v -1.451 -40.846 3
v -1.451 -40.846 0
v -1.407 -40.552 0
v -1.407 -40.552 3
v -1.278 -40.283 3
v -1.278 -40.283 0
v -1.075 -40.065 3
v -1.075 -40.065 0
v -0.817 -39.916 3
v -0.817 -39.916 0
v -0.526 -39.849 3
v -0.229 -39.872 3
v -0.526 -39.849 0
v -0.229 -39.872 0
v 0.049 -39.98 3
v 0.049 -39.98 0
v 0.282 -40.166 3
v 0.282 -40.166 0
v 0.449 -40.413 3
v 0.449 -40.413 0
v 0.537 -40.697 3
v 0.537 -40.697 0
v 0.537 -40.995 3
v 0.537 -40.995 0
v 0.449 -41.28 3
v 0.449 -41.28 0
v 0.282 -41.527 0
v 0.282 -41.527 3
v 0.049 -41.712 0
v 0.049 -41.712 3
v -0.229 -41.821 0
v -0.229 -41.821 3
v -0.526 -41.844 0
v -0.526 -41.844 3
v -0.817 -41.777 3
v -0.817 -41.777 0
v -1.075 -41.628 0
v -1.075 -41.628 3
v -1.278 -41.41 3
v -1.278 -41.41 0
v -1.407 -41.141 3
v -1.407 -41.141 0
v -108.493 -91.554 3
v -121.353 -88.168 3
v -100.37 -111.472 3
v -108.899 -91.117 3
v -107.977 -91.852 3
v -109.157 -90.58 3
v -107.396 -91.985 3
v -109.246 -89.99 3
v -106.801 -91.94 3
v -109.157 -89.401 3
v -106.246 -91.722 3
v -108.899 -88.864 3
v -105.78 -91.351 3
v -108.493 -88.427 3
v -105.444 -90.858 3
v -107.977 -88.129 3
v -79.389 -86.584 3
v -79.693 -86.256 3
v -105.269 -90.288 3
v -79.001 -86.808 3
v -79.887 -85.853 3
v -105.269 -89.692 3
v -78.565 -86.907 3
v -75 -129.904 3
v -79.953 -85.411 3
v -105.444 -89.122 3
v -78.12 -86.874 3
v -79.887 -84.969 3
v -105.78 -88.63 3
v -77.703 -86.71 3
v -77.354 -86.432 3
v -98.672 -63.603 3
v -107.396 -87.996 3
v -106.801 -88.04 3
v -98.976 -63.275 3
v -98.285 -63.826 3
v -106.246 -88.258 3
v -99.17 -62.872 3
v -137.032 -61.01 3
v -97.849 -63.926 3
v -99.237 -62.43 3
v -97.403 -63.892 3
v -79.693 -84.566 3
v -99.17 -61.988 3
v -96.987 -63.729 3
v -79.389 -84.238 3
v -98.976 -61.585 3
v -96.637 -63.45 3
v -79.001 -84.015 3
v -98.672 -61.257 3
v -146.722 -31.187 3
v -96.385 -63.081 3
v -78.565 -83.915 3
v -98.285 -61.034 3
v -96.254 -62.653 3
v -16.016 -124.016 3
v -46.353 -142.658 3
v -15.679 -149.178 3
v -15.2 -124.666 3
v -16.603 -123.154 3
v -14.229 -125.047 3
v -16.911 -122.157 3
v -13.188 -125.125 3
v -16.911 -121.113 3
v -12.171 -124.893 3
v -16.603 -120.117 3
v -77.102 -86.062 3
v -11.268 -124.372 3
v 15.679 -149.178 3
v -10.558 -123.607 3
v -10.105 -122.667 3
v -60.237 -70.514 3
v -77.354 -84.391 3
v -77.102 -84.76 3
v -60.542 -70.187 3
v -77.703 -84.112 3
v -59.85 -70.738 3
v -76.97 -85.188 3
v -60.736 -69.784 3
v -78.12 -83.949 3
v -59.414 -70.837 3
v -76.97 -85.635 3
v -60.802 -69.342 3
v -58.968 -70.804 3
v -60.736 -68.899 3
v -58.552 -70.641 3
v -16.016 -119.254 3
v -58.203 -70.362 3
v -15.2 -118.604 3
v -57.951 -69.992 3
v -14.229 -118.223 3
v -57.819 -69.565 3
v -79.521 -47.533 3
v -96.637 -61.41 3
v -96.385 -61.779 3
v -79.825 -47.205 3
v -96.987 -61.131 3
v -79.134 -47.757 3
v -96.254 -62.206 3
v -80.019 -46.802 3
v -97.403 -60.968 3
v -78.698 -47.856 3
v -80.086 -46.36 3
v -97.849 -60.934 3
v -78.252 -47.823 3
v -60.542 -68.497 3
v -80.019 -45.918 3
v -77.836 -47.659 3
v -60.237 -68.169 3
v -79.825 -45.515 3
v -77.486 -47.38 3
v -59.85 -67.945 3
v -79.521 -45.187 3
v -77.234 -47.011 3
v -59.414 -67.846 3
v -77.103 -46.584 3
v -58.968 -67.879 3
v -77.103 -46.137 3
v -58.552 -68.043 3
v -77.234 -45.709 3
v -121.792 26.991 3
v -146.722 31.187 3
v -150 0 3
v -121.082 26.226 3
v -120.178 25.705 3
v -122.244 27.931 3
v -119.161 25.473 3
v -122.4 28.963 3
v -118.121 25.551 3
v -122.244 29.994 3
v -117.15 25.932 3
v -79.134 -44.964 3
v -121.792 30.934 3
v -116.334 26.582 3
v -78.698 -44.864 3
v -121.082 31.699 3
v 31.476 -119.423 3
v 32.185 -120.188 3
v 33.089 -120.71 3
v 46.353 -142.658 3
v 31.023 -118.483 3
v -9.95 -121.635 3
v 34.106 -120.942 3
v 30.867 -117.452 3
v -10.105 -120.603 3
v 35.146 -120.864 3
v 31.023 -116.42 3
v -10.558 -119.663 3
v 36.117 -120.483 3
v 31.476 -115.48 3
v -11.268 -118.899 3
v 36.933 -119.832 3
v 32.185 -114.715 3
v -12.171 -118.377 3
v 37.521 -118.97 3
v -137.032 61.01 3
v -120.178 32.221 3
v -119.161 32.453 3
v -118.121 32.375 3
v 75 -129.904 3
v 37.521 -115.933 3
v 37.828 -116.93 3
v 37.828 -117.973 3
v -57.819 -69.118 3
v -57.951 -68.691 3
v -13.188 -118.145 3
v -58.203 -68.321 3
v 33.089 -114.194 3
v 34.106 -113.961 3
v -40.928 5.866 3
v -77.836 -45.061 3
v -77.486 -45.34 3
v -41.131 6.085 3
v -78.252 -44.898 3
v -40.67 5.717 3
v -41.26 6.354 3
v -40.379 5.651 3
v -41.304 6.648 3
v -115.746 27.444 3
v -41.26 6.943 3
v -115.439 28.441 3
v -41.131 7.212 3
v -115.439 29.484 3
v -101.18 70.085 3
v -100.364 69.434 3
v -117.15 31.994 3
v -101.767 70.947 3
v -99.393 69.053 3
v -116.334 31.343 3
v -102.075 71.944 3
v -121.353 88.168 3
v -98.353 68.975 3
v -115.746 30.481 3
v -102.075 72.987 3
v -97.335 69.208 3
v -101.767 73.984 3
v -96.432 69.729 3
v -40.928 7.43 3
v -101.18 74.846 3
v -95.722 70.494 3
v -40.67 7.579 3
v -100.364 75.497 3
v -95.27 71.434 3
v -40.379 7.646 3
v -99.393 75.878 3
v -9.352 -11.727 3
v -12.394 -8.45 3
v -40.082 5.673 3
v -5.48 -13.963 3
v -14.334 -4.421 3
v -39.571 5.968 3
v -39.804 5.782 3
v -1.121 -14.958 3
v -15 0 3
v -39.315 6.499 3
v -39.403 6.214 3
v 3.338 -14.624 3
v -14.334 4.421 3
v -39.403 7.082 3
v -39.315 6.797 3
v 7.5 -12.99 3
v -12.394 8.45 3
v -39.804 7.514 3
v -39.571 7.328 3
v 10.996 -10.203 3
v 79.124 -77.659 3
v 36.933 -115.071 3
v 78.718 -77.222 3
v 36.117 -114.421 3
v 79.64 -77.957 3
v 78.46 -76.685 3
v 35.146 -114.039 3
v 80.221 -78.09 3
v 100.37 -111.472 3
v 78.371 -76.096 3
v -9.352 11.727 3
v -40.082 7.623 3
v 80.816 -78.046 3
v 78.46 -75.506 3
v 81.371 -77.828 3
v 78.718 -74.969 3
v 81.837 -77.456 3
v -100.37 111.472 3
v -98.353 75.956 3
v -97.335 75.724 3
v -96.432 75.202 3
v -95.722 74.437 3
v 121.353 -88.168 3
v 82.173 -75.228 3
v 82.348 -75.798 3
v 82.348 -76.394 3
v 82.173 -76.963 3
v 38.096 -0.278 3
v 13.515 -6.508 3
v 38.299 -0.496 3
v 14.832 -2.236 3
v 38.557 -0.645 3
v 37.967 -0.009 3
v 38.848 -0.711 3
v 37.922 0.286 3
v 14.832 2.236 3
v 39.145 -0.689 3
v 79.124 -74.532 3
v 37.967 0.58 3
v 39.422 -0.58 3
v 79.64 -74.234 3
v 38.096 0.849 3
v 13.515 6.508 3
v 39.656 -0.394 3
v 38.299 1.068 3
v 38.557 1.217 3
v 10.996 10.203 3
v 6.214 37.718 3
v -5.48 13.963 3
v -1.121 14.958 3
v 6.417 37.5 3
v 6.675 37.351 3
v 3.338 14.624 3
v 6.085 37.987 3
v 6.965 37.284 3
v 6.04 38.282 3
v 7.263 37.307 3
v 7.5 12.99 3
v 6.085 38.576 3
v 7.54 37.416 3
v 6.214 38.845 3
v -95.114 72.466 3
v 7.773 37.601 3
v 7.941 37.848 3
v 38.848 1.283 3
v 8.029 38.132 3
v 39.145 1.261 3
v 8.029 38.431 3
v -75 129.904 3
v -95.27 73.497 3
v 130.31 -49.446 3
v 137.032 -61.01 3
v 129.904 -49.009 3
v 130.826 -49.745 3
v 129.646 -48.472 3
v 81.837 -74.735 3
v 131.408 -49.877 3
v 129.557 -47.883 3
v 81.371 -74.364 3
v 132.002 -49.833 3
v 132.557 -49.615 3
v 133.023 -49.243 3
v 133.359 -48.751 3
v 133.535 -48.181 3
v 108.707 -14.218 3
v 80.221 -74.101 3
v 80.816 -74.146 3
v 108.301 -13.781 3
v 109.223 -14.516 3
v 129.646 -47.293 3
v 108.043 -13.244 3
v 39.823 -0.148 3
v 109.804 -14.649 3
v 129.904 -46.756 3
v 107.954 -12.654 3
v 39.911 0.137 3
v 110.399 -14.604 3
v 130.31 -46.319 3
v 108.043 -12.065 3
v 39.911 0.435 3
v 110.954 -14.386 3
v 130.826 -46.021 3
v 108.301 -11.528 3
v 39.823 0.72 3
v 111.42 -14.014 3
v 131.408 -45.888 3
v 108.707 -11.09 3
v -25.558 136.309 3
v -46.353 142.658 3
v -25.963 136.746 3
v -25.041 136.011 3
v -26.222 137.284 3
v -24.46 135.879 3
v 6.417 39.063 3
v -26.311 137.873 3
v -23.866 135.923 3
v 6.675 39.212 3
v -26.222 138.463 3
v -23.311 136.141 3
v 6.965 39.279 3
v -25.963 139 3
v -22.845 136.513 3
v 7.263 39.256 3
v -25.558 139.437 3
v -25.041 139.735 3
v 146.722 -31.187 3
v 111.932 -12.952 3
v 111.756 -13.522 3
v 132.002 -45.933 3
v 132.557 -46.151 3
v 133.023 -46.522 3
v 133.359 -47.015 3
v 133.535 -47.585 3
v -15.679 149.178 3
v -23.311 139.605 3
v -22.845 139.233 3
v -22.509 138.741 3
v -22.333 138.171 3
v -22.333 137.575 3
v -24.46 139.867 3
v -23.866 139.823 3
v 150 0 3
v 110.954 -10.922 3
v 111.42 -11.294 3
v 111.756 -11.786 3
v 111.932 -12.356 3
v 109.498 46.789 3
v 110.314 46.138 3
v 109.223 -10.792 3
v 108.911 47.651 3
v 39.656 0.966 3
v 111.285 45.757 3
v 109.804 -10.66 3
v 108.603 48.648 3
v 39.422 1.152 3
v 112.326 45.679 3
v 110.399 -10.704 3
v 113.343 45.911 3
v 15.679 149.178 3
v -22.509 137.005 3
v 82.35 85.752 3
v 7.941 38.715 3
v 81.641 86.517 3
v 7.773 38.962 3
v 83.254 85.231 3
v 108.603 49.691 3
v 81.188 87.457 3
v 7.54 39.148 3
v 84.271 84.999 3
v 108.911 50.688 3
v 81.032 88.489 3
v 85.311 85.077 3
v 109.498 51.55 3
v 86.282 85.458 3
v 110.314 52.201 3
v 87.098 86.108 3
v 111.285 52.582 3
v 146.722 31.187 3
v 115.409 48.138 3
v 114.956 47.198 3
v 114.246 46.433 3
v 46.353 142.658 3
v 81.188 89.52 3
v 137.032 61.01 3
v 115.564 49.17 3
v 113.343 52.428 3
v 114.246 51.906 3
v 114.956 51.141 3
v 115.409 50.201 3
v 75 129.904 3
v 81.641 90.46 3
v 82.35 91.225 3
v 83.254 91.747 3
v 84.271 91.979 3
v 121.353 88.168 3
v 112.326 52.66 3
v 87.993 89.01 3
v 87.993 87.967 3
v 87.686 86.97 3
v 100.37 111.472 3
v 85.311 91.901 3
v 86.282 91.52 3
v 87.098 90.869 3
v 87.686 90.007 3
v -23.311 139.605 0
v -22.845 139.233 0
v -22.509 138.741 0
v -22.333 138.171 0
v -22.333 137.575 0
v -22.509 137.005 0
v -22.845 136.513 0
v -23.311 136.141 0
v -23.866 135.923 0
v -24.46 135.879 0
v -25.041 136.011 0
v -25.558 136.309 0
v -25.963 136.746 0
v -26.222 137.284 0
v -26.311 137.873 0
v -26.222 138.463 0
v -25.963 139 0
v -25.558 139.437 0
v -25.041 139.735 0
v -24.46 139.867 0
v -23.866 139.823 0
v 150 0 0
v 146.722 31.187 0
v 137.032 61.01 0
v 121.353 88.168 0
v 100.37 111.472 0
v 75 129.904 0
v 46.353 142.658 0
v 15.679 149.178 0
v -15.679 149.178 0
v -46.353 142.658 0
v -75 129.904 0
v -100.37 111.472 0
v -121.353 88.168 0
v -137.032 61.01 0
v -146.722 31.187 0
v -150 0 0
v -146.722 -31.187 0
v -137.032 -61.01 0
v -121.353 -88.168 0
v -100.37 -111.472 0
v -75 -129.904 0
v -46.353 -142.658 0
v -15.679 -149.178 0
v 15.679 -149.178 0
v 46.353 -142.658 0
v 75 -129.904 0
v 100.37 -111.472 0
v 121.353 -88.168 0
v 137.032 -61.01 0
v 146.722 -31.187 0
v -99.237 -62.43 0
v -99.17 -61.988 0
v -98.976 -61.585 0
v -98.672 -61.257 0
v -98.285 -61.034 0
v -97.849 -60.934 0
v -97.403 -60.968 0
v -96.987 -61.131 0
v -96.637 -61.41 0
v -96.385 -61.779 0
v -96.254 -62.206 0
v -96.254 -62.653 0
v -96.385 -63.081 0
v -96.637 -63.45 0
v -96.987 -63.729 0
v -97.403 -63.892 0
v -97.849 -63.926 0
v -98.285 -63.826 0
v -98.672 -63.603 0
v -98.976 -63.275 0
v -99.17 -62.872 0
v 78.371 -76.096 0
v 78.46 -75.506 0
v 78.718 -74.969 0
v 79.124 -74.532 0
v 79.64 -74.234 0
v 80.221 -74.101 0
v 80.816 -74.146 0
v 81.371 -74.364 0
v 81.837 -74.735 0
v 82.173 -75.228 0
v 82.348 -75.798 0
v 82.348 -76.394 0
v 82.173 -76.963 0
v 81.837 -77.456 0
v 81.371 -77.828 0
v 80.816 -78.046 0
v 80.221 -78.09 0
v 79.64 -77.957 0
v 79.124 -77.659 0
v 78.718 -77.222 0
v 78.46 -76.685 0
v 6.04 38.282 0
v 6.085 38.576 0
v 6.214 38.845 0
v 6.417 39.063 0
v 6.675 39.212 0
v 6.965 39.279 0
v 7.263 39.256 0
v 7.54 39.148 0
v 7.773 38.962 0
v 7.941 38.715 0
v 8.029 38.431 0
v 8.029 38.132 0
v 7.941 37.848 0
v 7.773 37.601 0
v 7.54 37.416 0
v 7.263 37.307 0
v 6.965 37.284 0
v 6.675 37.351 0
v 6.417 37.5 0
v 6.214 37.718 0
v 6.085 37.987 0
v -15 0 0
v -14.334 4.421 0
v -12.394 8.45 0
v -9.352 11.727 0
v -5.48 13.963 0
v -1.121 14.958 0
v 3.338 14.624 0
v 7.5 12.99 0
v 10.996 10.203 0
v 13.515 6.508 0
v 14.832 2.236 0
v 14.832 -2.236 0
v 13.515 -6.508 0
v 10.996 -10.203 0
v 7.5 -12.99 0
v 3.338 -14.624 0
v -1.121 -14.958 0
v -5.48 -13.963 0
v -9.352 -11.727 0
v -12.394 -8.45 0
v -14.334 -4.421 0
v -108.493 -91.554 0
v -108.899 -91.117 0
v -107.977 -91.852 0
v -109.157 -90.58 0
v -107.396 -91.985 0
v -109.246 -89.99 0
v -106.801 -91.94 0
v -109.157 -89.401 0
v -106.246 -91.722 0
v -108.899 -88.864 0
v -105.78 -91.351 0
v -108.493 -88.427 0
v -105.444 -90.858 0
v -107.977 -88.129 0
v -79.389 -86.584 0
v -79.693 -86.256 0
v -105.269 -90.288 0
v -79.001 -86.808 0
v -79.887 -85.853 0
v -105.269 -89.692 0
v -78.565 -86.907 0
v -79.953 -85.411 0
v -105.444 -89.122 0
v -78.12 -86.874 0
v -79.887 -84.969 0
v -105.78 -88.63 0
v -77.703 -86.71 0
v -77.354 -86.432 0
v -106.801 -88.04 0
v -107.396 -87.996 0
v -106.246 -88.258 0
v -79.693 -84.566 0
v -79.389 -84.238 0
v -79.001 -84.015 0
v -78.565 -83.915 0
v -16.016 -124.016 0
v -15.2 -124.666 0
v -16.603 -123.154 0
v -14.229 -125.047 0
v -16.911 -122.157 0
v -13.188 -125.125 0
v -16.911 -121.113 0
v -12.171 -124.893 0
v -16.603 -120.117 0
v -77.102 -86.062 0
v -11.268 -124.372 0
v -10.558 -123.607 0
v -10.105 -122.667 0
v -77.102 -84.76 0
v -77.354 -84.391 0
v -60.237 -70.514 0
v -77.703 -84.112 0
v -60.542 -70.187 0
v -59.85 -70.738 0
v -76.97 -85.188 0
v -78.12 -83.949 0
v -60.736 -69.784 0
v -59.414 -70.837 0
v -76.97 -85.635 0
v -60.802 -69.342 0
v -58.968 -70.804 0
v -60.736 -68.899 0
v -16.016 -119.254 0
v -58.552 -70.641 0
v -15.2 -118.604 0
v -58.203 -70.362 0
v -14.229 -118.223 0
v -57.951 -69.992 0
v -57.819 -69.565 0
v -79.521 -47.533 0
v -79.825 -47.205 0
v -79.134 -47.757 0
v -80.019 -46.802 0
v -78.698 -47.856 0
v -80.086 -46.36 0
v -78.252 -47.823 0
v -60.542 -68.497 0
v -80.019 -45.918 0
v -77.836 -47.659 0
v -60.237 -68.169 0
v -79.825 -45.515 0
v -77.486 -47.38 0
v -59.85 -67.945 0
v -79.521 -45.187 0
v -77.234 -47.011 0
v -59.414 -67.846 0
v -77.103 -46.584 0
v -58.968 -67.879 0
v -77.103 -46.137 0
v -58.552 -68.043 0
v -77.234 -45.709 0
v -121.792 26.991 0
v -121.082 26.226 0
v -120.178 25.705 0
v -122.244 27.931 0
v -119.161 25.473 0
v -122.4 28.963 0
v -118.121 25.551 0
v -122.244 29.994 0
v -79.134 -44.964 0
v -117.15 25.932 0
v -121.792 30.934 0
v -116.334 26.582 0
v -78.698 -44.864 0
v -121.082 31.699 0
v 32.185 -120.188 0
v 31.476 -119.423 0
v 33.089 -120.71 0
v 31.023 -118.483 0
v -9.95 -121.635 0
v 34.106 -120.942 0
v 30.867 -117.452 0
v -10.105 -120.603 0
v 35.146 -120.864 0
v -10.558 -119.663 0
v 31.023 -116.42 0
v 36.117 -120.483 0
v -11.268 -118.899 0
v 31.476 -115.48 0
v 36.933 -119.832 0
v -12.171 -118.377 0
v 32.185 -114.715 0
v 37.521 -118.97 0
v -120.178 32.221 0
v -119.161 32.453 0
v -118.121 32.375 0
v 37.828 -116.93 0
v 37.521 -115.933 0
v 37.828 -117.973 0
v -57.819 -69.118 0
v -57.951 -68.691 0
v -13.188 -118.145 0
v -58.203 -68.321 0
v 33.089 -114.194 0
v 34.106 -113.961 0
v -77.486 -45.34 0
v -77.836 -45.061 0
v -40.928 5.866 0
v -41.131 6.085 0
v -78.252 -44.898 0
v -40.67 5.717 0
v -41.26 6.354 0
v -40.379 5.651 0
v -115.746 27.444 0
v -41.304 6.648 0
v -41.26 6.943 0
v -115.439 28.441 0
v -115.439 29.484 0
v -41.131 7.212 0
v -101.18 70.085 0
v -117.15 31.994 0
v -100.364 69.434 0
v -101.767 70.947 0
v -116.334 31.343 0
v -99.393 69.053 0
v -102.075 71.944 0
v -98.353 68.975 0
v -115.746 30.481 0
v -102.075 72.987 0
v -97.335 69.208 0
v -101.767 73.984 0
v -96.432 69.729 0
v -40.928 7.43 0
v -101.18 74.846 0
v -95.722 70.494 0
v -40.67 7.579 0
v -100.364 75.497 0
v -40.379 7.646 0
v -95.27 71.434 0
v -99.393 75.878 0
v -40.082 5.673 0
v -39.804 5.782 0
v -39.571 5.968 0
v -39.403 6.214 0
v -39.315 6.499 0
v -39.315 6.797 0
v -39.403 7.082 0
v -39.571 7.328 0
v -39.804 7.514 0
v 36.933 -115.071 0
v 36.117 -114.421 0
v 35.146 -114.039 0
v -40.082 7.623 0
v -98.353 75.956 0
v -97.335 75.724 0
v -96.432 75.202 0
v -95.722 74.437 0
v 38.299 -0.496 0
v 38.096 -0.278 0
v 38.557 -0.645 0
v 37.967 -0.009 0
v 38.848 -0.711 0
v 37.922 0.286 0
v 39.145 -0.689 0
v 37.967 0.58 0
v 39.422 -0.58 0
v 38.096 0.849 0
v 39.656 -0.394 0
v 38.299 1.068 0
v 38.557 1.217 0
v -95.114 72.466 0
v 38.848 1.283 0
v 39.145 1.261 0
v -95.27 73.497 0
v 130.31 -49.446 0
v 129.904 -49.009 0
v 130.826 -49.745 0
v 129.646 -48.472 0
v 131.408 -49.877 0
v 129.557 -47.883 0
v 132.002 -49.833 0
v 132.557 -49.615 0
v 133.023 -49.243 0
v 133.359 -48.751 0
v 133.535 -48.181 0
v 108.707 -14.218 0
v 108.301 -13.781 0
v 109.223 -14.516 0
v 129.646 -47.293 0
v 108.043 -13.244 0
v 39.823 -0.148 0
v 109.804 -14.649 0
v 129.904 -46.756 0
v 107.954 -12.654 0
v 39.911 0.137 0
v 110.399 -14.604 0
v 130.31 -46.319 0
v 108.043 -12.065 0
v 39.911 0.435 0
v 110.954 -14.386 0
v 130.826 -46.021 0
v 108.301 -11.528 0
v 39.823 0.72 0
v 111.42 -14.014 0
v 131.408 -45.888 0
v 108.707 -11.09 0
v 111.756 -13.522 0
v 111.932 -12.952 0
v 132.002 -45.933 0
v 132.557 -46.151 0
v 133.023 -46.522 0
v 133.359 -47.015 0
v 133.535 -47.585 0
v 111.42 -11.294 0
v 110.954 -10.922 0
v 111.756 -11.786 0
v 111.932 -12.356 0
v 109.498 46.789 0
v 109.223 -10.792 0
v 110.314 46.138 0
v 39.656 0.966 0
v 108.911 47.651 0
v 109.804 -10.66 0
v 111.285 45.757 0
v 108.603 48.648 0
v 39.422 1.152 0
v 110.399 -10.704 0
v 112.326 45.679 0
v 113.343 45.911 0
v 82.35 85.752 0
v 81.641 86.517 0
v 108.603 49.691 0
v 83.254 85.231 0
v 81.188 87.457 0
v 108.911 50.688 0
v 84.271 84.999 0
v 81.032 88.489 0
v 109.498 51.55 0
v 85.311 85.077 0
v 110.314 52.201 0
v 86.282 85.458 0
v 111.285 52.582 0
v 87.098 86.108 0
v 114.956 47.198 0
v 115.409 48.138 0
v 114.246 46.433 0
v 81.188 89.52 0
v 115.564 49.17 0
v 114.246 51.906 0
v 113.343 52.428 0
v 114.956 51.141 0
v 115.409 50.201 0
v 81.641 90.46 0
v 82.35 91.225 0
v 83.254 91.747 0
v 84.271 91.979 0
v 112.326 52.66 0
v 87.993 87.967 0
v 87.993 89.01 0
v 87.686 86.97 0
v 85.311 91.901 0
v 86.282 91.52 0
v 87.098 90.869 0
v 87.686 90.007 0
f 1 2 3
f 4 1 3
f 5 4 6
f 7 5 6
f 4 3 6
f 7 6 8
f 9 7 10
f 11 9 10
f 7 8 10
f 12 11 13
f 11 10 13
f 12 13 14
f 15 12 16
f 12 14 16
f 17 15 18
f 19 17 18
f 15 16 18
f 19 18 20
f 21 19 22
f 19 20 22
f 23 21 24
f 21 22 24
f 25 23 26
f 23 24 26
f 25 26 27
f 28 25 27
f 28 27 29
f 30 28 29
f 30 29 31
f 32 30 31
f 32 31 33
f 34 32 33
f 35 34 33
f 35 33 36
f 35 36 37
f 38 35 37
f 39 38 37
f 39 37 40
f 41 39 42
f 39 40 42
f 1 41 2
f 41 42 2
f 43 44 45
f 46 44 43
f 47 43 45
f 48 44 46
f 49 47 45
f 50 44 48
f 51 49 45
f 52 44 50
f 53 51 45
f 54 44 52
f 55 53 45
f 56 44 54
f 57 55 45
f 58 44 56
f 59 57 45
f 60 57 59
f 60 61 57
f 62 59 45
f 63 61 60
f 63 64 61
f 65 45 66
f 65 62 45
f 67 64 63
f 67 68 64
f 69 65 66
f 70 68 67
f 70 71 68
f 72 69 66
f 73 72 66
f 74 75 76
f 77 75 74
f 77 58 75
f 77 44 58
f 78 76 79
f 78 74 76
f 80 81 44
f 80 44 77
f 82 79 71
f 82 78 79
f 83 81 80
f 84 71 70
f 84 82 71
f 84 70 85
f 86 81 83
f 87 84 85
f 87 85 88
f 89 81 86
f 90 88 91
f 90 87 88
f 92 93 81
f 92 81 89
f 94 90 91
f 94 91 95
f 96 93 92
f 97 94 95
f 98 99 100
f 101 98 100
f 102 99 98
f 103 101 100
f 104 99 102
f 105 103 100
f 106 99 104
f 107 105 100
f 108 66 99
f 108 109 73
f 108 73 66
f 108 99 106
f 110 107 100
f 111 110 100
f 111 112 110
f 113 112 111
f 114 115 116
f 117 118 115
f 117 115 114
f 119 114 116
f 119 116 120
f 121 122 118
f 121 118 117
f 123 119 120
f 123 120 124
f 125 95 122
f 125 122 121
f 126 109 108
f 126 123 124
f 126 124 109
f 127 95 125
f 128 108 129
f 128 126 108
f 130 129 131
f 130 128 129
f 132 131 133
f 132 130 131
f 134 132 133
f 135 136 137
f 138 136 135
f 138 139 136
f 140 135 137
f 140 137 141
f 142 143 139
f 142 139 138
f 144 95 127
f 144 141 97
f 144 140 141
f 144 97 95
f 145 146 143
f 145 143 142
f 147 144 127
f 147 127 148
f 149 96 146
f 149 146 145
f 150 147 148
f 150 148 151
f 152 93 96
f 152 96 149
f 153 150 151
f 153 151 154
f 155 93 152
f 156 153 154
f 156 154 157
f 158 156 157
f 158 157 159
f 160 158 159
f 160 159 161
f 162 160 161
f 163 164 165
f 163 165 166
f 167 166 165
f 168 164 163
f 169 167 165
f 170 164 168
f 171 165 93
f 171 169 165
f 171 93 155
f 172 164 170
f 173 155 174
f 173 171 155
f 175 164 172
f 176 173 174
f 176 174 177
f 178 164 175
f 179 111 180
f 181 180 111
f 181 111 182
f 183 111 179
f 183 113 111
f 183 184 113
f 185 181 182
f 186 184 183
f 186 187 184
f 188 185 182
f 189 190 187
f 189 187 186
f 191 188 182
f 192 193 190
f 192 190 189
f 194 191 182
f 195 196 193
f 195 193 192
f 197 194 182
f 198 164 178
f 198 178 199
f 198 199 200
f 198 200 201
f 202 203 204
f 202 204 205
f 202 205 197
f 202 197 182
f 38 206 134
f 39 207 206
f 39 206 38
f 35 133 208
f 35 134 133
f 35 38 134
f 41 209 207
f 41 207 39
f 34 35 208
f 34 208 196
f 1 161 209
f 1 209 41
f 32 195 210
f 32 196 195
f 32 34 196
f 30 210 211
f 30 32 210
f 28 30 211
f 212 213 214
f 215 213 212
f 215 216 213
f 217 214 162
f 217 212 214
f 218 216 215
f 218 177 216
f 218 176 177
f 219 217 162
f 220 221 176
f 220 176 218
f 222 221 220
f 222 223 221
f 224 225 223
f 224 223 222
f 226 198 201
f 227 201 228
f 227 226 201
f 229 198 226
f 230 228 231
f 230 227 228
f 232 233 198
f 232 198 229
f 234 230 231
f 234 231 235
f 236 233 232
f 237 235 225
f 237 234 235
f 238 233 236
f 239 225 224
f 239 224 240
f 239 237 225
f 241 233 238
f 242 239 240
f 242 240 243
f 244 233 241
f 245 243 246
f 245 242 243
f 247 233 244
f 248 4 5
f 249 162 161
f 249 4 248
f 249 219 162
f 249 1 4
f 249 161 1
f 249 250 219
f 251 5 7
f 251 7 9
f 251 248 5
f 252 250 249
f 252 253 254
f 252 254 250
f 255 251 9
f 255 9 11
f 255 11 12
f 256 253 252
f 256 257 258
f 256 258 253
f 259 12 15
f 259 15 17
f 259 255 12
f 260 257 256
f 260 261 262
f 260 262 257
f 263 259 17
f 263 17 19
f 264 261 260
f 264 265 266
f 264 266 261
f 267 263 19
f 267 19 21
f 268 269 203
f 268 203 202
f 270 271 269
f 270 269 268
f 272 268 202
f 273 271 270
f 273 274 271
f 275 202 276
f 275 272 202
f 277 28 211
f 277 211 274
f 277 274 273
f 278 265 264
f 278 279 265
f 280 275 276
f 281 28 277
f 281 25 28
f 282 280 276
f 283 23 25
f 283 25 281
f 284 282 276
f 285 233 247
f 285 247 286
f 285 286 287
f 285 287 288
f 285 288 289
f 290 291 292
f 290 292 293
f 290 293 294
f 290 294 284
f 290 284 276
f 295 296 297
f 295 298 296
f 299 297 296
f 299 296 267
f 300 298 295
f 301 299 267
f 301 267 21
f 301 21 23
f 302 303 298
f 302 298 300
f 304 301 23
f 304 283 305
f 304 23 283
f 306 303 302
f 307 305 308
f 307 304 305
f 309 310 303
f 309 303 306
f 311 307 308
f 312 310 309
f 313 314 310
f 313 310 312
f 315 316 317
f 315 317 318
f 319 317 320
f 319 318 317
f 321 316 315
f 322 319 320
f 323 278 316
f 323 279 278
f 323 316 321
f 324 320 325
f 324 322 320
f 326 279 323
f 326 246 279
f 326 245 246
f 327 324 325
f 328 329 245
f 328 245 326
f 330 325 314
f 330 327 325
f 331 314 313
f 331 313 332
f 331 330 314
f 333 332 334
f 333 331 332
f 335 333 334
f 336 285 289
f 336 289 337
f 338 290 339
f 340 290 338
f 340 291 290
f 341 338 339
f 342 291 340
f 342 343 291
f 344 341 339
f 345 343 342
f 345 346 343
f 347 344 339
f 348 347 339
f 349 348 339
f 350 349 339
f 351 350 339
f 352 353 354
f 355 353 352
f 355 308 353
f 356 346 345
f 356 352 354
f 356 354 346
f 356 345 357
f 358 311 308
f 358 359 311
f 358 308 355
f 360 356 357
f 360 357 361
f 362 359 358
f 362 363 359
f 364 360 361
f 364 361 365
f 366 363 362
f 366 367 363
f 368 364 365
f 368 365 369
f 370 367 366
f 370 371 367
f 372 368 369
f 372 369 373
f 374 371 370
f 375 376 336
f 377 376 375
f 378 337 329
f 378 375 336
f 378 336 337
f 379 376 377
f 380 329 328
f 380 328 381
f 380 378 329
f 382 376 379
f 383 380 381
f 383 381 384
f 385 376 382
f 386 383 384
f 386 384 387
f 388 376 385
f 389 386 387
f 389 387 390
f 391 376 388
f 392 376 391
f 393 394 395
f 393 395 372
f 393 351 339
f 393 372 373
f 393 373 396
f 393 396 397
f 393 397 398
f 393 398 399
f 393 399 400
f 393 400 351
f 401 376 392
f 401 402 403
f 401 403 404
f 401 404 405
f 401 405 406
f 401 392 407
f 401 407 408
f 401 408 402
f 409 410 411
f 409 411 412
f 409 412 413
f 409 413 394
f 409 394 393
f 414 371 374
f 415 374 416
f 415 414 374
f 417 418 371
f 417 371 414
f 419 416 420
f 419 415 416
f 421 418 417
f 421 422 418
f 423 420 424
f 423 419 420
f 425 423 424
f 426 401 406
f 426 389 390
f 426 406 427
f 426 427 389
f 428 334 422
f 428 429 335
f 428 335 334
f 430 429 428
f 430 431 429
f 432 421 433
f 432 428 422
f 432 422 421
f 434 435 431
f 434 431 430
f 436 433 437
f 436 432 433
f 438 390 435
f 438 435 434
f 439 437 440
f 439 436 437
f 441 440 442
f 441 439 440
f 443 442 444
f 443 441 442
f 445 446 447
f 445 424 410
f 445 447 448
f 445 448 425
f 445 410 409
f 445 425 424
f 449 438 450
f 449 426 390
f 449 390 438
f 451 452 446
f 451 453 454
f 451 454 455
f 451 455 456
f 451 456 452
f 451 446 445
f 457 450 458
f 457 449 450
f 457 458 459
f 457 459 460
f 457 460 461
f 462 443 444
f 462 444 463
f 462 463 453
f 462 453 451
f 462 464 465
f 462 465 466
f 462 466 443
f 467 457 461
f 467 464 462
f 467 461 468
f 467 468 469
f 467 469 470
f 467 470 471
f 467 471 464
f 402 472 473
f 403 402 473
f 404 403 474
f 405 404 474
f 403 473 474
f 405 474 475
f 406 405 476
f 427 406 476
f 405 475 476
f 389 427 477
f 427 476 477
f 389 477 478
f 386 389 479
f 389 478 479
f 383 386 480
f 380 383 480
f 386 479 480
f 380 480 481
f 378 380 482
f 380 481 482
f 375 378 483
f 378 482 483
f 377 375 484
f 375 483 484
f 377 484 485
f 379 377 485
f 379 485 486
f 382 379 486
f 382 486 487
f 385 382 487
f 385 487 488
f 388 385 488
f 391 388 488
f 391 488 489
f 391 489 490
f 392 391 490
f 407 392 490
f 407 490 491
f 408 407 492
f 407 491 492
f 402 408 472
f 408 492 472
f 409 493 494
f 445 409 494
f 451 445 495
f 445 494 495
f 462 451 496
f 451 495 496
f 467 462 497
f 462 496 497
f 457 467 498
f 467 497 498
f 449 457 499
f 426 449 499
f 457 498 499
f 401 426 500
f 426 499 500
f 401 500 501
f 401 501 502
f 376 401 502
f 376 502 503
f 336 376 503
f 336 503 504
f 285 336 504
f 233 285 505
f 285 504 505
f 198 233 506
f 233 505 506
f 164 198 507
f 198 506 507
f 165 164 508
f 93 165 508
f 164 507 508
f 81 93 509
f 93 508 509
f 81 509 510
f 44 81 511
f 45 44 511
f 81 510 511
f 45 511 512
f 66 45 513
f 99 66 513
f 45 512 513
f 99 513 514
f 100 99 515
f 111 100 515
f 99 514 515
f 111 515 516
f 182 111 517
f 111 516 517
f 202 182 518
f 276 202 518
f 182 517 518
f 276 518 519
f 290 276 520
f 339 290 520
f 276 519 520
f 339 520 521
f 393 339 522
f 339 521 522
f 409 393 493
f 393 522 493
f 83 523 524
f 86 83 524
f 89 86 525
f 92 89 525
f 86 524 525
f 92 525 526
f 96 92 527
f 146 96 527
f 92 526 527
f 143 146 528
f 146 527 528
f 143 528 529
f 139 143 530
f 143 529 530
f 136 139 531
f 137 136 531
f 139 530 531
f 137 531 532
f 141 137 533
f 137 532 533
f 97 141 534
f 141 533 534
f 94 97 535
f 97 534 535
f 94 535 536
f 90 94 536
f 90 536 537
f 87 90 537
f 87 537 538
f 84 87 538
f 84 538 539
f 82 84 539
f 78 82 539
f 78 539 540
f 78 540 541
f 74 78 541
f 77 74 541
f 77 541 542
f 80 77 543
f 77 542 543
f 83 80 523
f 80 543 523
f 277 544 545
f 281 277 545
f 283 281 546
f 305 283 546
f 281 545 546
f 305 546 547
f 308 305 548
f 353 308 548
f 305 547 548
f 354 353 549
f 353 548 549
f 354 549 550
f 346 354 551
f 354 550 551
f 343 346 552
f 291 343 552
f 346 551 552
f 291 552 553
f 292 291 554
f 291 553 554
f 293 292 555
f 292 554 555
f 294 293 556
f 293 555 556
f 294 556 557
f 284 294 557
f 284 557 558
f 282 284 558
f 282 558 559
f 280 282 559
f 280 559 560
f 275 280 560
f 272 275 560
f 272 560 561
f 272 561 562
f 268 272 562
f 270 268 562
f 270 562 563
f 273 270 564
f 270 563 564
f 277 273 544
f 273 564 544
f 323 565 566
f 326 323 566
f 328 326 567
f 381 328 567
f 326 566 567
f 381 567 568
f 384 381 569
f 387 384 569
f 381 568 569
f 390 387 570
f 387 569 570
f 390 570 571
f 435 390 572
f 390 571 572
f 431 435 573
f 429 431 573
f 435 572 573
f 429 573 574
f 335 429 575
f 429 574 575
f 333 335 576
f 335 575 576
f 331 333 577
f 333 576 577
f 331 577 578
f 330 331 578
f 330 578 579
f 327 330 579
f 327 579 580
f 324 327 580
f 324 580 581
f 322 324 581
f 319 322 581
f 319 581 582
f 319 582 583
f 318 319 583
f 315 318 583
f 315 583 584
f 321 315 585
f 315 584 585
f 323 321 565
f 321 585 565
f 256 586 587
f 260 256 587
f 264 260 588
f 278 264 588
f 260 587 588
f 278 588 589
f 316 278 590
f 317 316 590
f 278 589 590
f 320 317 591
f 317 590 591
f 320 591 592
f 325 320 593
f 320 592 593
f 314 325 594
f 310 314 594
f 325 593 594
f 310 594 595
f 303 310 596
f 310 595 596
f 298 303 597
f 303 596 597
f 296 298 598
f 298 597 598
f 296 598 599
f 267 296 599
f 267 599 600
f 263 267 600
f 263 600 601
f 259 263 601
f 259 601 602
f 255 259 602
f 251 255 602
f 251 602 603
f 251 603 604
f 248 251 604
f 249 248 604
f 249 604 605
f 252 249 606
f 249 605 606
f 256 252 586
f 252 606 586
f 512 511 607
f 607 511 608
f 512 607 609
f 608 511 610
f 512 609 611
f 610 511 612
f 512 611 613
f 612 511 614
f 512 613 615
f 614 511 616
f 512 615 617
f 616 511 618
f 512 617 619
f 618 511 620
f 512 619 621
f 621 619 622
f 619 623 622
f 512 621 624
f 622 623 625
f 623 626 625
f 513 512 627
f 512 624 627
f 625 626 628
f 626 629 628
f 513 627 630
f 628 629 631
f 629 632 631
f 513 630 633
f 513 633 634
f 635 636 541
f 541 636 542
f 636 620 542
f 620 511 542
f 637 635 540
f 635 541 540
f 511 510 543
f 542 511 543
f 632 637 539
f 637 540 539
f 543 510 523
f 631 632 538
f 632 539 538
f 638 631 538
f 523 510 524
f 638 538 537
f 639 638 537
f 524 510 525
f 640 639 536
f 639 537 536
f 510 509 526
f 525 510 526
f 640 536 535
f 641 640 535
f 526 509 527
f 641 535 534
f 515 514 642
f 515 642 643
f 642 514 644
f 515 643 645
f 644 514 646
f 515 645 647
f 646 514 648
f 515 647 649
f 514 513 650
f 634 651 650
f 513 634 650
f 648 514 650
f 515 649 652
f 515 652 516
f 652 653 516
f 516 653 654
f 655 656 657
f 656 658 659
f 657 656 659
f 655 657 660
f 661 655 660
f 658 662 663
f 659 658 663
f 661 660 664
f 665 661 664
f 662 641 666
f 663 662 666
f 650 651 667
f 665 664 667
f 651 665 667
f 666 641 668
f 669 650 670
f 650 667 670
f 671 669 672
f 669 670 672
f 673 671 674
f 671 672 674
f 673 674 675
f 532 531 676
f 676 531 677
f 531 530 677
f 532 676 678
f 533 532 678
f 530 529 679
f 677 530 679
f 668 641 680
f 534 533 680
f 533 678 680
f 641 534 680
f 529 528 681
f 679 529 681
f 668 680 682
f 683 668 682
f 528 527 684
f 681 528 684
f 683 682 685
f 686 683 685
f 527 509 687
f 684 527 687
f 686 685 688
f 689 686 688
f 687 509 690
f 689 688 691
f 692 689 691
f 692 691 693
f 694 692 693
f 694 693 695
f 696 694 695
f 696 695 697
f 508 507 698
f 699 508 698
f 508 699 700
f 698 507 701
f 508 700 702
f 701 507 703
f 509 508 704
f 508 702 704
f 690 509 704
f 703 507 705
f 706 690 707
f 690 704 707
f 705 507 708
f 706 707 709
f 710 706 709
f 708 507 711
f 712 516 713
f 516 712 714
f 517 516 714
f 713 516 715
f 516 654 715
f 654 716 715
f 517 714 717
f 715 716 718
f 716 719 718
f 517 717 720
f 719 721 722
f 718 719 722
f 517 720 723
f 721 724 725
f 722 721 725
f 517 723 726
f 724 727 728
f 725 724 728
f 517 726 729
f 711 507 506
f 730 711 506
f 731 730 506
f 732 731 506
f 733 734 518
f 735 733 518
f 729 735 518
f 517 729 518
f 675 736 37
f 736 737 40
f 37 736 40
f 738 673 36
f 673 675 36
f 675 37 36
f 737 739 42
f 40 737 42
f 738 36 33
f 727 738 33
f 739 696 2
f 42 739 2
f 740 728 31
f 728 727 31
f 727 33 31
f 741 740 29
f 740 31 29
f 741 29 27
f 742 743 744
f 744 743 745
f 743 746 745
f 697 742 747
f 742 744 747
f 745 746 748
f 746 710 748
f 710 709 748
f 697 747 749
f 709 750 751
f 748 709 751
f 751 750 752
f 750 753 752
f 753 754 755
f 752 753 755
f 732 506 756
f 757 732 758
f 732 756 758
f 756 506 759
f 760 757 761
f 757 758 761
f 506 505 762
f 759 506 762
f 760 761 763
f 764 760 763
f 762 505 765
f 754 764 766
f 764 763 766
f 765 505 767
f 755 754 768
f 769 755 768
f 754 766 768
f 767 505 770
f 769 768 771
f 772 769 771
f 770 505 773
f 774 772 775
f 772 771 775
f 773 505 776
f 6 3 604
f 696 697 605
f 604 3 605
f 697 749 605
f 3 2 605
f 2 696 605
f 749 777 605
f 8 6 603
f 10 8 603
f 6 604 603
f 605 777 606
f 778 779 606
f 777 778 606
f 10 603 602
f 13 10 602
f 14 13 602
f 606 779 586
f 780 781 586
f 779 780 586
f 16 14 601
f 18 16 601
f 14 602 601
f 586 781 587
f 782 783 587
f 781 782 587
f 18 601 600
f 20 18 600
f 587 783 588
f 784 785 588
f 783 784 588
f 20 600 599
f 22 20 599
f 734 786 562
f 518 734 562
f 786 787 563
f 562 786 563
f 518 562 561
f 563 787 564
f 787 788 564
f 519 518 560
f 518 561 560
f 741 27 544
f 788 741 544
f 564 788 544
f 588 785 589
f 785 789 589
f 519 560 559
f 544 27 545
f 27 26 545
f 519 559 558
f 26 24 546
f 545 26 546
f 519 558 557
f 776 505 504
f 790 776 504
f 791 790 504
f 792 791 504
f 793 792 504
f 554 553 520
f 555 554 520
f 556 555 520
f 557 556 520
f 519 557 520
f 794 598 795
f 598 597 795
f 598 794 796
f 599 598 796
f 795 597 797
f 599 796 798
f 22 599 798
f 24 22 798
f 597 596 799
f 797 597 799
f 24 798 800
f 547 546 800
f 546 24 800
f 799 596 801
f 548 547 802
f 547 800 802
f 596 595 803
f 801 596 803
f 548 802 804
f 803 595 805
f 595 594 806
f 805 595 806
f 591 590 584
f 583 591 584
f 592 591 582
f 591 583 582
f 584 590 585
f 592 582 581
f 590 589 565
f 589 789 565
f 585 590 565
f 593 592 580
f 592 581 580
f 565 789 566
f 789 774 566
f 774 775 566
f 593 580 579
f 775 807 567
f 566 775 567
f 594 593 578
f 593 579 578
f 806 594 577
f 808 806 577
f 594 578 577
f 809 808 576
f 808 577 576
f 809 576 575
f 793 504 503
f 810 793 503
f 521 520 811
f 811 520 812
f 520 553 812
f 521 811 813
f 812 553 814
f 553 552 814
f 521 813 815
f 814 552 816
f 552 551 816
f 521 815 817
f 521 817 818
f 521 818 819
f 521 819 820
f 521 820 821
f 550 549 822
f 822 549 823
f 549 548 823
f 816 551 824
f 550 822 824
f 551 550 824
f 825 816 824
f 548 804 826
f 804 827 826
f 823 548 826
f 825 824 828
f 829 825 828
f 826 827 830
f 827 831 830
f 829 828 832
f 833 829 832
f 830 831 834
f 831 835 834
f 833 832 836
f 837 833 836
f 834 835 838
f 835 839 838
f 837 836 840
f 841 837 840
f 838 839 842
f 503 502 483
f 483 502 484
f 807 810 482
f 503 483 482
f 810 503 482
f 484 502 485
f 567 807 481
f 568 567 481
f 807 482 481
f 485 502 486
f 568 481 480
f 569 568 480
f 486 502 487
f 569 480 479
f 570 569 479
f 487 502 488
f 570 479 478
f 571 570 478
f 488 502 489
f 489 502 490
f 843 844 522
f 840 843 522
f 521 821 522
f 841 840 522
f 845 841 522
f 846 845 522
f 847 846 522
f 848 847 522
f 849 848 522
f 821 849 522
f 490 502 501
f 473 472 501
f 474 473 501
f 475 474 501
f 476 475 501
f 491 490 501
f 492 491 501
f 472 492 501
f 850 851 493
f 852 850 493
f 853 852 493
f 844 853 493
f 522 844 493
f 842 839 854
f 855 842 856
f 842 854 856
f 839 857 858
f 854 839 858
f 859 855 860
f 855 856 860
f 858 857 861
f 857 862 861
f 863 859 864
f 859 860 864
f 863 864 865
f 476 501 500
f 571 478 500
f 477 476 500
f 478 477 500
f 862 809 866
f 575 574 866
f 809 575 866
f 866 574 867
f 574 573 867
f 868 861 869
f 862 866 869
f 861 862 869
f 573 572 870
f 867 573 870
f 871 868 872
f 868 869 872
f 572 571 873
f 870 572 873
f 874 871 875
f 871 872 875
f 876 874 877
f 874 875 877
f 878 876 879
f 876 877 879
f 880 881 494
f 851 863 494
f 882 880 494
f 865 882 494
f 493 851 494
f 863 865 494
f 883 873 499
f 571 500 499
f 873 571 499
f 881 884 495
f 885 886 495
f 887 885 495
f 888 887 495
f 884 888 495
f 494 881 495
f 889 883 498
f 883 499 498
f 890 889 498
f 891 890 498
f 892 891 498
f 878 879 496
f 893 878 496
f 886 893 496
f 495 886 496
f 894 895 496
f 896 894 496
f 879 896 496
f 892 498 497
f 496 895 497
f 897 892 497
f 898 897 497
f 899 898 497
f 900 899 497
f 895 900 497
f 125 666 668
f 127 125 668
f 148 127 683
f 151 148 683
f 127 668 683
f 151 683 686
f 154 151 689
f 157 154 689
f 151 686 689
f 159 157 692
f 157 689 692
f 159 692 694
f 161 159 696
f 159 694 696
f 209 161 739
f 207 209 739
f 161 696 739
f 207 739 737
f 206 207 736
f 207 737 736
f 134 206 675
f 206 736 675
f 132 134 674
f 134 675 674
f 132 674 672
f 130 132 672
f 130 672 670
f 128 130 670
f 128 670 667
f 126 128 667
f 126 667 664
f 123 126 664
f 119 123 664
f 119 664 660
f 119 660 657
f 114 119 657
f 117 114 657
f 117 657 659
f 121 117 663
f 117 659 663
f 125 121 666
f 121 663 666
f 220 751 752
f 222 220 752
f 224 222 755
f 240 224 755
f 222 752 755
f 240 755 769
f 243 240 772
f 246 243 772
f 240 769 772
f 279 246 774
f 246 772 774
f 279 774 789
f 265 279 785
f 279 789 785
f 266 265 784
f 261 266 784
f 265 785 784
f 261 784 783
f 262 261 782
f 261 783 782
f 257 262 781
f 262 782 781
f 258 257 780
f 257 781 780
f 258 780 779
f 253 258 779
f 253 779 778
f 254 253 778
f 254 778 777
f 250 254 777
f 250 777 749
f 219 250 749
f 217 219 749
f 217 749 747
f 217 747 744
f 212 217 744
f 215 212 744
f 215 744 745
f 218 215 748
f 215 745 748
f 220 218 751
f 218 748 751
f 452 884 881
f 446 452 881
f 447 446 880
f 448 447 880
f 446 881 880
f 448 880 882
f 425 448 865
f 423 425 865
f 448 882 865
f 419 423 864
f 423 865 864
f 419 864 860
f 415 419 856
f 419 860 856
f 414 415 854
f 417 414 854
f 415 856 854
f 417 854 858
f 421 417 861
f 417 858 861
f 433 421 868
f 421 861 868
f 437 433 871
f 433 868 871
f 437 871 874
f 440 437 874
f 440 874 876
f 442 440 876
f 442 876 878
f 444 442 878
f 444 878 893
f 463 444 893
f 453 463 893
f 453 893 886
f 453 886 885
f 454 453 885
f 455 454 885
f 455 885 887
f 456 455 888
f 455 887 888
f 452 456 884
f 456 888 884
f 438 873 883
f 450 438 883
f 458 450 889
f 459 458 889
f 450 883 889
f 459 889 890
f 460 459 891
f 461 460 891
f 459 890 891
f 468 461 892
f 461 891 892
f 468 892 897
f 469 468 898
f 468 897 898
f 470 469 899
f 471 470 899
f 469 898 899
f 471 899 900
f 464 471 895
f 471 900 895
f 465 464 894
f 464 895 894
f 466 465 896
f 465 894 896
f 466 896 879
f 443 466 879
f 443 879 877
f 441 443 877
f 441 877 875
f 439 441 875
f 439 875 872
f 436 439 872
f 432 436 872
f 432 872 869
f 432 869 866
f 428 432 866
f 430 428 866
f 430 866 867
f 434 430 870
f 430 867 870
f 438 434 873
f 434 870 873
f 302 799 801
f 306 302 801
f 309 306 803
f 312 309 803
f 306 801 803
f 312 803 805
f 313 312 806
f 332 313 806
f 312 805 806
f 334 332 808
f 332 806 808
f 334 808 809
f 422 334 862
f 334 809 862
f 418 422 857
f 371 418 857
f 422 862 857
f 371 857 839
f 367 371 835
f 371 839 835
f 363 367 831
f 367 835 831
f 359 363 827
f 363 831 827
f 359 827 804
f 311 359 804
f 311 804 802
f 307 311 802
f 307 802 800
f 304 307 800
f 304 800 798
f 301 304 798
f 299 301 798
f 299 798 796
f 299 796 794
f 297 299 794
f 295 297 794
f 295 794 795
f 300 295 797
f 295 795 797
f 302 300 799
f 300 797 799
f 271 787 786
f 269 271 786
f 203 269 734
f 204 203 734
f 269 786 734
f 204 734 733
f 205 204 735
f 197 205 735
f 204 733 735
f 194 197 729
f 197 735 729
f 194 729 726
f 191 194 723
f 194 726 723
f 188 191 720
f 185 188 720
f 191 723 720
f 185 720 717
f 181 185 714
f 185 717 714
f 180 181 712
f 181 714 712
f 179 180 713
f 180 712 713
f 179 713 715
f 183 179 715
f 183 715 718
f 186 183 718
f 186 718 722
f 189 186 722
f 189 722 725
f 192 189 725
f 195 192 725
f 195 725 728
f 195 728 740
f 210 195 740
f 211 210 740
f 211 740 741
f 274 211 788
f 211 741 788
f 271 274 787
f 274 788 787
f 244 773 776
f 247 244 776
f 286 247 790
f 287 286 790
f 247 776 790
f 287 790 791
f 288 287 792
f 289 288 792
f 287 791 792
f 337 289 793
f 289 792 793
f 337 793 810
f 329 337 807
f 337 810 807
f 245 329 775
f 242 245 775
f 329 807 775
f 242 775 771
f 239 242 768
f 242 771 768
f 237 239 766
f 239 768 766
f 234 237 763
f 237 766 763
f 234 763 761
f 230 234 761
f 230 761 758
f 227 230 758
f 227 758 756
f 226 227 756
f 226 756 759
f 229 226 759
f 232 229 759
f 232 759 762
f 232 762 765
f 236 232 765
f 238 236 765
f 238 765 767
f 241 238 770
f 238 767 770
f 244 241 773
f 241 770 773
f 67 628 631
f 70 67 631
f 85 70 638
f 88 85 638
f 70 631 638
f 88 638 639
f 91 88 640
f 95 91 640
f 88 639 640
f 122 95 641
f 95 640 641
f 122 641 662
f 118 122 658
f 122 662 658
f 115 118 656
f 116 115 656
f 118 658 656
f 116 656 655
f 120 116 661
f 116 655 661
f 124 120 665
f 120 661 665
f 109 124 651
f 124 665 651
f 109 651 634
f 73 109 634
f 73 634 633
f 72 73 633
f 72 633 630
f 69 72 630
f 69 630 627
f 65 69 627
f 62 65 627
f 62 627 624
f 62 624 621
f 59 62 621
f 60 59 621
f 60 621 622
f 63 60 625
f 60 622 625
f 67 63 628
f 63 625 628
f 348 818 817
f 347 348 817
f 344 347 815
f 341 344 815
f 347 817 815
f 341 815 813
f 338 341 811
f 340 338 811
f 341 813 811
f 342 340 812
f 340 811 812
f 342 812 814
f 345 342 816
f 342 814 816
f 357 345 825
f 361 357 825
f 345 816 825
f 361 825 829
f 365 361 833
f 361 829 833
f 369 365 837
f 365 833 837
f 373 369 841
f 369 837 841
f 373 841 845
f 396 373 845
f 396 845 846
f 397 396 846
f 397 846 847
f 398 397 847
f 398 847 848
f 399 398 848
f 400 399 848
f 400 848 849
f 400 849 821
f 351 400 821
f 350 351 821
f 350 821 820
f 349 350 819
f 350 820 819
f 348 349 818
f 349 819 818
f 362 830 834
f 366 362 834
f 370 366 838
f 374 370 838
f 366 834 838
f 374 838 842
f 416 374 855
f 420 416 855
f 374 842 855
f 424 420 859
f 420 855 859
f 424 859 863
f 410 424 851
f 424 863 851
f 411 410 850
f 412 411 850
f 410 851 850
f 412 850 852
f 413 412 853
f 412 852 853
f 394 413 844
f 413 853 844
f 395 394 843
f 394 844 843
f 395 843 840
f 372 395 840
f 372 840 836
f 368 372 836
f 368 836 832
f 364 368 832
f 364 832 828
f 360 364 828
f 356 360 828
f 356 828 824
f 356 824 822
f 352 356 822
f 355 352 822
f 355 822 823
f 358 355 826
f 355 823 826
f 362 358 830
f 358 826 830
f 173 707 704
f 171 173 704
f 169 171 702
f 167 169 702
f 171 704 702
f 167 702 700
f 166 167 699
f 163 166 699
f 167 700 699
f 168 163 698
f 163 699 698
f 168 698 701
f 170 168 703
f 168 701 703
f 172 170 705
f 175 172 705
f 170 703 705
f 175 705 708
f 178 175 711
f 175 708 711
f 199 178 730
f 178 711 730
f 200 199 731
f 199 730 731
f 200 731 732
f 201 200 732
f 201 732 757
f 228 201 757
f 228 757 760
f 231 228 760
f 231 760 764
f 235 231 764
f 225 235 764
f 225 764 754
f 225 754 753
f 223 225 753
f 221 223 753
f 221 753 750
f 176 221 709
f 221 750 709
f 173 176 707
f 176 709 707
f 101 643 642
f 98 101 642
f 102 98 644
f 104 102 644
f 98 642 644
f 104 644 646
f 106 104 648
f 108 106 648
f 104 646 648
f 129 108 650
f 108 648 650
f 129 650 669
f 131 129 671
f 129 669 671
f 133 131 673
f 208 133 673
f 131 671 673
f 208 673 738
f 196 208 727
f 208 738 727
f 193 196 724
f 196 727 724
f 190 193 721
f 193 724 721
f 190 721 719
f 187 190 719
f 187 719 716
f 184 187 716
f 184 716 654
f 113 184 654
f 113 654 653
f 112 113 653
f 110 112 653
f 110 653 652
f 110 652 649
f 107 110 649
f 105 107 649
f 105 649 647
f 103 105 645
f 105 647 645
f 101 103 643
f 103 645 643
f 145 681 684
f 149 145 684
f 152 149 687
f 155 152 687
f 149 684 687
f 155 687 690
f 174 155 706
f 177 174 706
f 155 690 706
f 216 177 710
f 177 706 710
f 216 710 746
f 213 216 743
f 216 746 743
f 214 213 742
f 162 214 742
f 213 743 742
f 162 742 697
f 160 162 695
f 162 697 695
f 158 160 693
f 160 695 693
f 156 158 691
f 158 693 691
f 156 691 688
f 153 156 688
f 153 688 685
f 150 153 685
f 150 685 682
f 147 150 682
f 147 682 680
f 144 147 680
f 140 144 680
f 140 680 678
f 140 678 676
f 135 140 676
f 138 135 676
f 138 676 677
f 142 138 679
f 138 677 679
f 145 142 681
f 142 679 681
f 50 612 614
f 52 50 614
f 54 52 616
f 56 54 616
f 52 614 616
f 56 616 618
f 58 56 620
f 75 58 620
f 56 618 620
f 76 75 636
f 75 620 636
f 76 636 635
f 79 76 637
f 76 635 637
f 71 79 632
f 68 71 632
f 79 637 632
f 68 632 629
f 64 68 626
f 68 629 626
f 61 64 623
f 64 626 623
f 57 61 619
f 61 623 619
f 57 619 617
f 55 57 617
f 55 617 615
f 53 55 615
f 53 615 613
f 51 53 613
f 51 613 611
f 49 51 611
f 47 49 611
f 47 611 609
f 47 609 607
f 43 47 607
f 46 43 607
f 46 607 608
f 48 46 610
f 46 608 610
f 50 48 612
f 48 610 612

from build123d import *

# Parameters (mm, degrees)
SKETCH1_R           = 150
BOSS_EXTRUDE1_DEPTH = 3
SKETCH2_R           = 3.5
CUT_EXTRUDE1_DEPTH  = 3
CIRPATTERN1_COUNT   = 3
SKETCH3_R           = 2
CUT_EXTRUDE2_DEPTH  = 3
SKETCH4_R           = 15
CUT_EXTRUDE3_DEPTH  = 3
SKETCH5_R           = 1
CUT_EXTRUDE4_DEPTH  = 3
SKETCH6_R           = 1.5
CUT_EXTRUDE5_DEPTH  = 3
SKETCH7_R           = 2
CUT_EXTRUDE6_DEPTH  = 3
CIRPATTERN2_COUNT   = 3


with BuildPart() as part:
    # Sketch1 → Boss-Extrude1 (new body)
    with BuildSketch(Plane.XY):
        Circle(SKETCH1_R)
    extrude(amount=BOSS_EXTRUDE1_DEPTH)

    # Sketch2 → Cut-Extrude1 (cut)
    with BuildSketch(Plane(origin=(0, 0, 0), x_dir=(-1, 0, 0), z_dir=(0, 0, -1))):
        with Locations((-84.532410842, 88.488821425)):
            Circle(SKETCH2_R)
        with Locations(Location((-112.064079787, 49.169523299, 0), (0, 0, 180))):
            Circle(SKETCH2_R)
    cut_extrude1 = extrude(amount=-CUT_EXTRUDE1_DEPTH, mode=Mode.SUBTRACT)

    # CirPattern1: Cut-Extrude1 ×3 about axis
    cirpattern1_axis = Axis((0, 0, 0), (0, 0, 1))
    for i in range(1, CIRPATTERN1_COUNT):
        add(cut_extrude1.rotate(cirpattern1_axis, i * 360 / CIRPATTERN1_COUNT), mode=Mode.SUBTRACT)

    # Sketch3 → Cut-Extrude2 (cut)
    with BuildSketch(Plane(origin=(0, 0, 0), x_dir=(-1, 0, 0), z_dir=(0, 0, -1))):
        with Locations((-109.9539568, -12.654144936)):
            Circle(SKETCH3_R)
        with Locations((-80.370678478, -76.095690029)):
            Circle(SKETCH3_R)
    extrude(amount=-CUT_EXTRUDE2_DEPTH, mode=Mode.SUBTRACT)

    # Sketch4 → Cut-Extrude3 (cut)
    with BuildSketch(Plane(origin=(0, 0, 0), x_dir=(-1, 0, 0), z_dir=(0, 0, -1))):
        Circle(SKETCH4_R)
    extrude(amount=-CUT_EXTRUDE3_DEPTH, mode=Mode.SUBTRACT)

    # Sketch5 → Cut-Extrude4 (cut)
    with BuildSketch(Plane(origin=(0, 0, 0), x_dir=(-1, 0, 0), z_dir=(0, 0, -1))):
        with Locations((0.451473383, -40.846457118)):
            Circle(SKETCH5_R)
        with Locations((-38.922466014, 0.285726101)):
            Circle(SKETCH5_R)
        with Locations((40.304305183, 6.648298355)):
            Circle(SKETCH5_R)
        with Locations((-7.040200573, 38.28153048)):
            Circle(SKETCH5_R)
    extrude(amount=-CUT_EXTRUDE4_DEPTH, mode=Mode.SUBTRACT)

    # Sketch6 → Cut-Extrude5 (cut)
    with BuildSketch(Plane(origin=(0, 0, 0), x_dir=(-1, 0, 0), z_dir=(0, 0, -1))):
        with Locations((59.302185735, -69.341551519)):
            Circle(SKETCH6_R)
        with Locations((78.453296813, -85.411241761)):
            Circle(SKETCH6_R)
        with Locations((97.736925104, -62.429908467)):
            Circle(SKETCH6_R)
        with Locations((78.585814026, -46.360218225)):
            Circle(SKETCH6_R)
    extrude(amount=-CUT_EXTRUDE5_DEPTH, mode=Mode.SUBTRACT)

    # Sketch7 → Cut-Extrude6 (cut)
    with BuildSketch(Plane(origin=(0, 0, 0), x_dir=(-1, 0, 0), z_dir=(0, 0, -1))):
        with Locations((107.246222037, -89.990265356)):
            Circle(SKETCH7_R)
    cut_extrude6 = extrude(amount=-CUT_EXTRUDE6_DEPTH, mode=Mode.SUBTRACT)

    # CirPattern2: Cut-Extrude6 ×3 about axis
    cirpattern2_axis = Axis((0, 0, 0), (0, 0, 1))
    for i in range(1, CIRPATTERN2_COUNT):
        add(cut_extrude6.rotate(cirpattern2_axis, i * 360 / CIRPATTERN2_COUNT), mode=Mode.SUBTRACT)


solid = part.part
